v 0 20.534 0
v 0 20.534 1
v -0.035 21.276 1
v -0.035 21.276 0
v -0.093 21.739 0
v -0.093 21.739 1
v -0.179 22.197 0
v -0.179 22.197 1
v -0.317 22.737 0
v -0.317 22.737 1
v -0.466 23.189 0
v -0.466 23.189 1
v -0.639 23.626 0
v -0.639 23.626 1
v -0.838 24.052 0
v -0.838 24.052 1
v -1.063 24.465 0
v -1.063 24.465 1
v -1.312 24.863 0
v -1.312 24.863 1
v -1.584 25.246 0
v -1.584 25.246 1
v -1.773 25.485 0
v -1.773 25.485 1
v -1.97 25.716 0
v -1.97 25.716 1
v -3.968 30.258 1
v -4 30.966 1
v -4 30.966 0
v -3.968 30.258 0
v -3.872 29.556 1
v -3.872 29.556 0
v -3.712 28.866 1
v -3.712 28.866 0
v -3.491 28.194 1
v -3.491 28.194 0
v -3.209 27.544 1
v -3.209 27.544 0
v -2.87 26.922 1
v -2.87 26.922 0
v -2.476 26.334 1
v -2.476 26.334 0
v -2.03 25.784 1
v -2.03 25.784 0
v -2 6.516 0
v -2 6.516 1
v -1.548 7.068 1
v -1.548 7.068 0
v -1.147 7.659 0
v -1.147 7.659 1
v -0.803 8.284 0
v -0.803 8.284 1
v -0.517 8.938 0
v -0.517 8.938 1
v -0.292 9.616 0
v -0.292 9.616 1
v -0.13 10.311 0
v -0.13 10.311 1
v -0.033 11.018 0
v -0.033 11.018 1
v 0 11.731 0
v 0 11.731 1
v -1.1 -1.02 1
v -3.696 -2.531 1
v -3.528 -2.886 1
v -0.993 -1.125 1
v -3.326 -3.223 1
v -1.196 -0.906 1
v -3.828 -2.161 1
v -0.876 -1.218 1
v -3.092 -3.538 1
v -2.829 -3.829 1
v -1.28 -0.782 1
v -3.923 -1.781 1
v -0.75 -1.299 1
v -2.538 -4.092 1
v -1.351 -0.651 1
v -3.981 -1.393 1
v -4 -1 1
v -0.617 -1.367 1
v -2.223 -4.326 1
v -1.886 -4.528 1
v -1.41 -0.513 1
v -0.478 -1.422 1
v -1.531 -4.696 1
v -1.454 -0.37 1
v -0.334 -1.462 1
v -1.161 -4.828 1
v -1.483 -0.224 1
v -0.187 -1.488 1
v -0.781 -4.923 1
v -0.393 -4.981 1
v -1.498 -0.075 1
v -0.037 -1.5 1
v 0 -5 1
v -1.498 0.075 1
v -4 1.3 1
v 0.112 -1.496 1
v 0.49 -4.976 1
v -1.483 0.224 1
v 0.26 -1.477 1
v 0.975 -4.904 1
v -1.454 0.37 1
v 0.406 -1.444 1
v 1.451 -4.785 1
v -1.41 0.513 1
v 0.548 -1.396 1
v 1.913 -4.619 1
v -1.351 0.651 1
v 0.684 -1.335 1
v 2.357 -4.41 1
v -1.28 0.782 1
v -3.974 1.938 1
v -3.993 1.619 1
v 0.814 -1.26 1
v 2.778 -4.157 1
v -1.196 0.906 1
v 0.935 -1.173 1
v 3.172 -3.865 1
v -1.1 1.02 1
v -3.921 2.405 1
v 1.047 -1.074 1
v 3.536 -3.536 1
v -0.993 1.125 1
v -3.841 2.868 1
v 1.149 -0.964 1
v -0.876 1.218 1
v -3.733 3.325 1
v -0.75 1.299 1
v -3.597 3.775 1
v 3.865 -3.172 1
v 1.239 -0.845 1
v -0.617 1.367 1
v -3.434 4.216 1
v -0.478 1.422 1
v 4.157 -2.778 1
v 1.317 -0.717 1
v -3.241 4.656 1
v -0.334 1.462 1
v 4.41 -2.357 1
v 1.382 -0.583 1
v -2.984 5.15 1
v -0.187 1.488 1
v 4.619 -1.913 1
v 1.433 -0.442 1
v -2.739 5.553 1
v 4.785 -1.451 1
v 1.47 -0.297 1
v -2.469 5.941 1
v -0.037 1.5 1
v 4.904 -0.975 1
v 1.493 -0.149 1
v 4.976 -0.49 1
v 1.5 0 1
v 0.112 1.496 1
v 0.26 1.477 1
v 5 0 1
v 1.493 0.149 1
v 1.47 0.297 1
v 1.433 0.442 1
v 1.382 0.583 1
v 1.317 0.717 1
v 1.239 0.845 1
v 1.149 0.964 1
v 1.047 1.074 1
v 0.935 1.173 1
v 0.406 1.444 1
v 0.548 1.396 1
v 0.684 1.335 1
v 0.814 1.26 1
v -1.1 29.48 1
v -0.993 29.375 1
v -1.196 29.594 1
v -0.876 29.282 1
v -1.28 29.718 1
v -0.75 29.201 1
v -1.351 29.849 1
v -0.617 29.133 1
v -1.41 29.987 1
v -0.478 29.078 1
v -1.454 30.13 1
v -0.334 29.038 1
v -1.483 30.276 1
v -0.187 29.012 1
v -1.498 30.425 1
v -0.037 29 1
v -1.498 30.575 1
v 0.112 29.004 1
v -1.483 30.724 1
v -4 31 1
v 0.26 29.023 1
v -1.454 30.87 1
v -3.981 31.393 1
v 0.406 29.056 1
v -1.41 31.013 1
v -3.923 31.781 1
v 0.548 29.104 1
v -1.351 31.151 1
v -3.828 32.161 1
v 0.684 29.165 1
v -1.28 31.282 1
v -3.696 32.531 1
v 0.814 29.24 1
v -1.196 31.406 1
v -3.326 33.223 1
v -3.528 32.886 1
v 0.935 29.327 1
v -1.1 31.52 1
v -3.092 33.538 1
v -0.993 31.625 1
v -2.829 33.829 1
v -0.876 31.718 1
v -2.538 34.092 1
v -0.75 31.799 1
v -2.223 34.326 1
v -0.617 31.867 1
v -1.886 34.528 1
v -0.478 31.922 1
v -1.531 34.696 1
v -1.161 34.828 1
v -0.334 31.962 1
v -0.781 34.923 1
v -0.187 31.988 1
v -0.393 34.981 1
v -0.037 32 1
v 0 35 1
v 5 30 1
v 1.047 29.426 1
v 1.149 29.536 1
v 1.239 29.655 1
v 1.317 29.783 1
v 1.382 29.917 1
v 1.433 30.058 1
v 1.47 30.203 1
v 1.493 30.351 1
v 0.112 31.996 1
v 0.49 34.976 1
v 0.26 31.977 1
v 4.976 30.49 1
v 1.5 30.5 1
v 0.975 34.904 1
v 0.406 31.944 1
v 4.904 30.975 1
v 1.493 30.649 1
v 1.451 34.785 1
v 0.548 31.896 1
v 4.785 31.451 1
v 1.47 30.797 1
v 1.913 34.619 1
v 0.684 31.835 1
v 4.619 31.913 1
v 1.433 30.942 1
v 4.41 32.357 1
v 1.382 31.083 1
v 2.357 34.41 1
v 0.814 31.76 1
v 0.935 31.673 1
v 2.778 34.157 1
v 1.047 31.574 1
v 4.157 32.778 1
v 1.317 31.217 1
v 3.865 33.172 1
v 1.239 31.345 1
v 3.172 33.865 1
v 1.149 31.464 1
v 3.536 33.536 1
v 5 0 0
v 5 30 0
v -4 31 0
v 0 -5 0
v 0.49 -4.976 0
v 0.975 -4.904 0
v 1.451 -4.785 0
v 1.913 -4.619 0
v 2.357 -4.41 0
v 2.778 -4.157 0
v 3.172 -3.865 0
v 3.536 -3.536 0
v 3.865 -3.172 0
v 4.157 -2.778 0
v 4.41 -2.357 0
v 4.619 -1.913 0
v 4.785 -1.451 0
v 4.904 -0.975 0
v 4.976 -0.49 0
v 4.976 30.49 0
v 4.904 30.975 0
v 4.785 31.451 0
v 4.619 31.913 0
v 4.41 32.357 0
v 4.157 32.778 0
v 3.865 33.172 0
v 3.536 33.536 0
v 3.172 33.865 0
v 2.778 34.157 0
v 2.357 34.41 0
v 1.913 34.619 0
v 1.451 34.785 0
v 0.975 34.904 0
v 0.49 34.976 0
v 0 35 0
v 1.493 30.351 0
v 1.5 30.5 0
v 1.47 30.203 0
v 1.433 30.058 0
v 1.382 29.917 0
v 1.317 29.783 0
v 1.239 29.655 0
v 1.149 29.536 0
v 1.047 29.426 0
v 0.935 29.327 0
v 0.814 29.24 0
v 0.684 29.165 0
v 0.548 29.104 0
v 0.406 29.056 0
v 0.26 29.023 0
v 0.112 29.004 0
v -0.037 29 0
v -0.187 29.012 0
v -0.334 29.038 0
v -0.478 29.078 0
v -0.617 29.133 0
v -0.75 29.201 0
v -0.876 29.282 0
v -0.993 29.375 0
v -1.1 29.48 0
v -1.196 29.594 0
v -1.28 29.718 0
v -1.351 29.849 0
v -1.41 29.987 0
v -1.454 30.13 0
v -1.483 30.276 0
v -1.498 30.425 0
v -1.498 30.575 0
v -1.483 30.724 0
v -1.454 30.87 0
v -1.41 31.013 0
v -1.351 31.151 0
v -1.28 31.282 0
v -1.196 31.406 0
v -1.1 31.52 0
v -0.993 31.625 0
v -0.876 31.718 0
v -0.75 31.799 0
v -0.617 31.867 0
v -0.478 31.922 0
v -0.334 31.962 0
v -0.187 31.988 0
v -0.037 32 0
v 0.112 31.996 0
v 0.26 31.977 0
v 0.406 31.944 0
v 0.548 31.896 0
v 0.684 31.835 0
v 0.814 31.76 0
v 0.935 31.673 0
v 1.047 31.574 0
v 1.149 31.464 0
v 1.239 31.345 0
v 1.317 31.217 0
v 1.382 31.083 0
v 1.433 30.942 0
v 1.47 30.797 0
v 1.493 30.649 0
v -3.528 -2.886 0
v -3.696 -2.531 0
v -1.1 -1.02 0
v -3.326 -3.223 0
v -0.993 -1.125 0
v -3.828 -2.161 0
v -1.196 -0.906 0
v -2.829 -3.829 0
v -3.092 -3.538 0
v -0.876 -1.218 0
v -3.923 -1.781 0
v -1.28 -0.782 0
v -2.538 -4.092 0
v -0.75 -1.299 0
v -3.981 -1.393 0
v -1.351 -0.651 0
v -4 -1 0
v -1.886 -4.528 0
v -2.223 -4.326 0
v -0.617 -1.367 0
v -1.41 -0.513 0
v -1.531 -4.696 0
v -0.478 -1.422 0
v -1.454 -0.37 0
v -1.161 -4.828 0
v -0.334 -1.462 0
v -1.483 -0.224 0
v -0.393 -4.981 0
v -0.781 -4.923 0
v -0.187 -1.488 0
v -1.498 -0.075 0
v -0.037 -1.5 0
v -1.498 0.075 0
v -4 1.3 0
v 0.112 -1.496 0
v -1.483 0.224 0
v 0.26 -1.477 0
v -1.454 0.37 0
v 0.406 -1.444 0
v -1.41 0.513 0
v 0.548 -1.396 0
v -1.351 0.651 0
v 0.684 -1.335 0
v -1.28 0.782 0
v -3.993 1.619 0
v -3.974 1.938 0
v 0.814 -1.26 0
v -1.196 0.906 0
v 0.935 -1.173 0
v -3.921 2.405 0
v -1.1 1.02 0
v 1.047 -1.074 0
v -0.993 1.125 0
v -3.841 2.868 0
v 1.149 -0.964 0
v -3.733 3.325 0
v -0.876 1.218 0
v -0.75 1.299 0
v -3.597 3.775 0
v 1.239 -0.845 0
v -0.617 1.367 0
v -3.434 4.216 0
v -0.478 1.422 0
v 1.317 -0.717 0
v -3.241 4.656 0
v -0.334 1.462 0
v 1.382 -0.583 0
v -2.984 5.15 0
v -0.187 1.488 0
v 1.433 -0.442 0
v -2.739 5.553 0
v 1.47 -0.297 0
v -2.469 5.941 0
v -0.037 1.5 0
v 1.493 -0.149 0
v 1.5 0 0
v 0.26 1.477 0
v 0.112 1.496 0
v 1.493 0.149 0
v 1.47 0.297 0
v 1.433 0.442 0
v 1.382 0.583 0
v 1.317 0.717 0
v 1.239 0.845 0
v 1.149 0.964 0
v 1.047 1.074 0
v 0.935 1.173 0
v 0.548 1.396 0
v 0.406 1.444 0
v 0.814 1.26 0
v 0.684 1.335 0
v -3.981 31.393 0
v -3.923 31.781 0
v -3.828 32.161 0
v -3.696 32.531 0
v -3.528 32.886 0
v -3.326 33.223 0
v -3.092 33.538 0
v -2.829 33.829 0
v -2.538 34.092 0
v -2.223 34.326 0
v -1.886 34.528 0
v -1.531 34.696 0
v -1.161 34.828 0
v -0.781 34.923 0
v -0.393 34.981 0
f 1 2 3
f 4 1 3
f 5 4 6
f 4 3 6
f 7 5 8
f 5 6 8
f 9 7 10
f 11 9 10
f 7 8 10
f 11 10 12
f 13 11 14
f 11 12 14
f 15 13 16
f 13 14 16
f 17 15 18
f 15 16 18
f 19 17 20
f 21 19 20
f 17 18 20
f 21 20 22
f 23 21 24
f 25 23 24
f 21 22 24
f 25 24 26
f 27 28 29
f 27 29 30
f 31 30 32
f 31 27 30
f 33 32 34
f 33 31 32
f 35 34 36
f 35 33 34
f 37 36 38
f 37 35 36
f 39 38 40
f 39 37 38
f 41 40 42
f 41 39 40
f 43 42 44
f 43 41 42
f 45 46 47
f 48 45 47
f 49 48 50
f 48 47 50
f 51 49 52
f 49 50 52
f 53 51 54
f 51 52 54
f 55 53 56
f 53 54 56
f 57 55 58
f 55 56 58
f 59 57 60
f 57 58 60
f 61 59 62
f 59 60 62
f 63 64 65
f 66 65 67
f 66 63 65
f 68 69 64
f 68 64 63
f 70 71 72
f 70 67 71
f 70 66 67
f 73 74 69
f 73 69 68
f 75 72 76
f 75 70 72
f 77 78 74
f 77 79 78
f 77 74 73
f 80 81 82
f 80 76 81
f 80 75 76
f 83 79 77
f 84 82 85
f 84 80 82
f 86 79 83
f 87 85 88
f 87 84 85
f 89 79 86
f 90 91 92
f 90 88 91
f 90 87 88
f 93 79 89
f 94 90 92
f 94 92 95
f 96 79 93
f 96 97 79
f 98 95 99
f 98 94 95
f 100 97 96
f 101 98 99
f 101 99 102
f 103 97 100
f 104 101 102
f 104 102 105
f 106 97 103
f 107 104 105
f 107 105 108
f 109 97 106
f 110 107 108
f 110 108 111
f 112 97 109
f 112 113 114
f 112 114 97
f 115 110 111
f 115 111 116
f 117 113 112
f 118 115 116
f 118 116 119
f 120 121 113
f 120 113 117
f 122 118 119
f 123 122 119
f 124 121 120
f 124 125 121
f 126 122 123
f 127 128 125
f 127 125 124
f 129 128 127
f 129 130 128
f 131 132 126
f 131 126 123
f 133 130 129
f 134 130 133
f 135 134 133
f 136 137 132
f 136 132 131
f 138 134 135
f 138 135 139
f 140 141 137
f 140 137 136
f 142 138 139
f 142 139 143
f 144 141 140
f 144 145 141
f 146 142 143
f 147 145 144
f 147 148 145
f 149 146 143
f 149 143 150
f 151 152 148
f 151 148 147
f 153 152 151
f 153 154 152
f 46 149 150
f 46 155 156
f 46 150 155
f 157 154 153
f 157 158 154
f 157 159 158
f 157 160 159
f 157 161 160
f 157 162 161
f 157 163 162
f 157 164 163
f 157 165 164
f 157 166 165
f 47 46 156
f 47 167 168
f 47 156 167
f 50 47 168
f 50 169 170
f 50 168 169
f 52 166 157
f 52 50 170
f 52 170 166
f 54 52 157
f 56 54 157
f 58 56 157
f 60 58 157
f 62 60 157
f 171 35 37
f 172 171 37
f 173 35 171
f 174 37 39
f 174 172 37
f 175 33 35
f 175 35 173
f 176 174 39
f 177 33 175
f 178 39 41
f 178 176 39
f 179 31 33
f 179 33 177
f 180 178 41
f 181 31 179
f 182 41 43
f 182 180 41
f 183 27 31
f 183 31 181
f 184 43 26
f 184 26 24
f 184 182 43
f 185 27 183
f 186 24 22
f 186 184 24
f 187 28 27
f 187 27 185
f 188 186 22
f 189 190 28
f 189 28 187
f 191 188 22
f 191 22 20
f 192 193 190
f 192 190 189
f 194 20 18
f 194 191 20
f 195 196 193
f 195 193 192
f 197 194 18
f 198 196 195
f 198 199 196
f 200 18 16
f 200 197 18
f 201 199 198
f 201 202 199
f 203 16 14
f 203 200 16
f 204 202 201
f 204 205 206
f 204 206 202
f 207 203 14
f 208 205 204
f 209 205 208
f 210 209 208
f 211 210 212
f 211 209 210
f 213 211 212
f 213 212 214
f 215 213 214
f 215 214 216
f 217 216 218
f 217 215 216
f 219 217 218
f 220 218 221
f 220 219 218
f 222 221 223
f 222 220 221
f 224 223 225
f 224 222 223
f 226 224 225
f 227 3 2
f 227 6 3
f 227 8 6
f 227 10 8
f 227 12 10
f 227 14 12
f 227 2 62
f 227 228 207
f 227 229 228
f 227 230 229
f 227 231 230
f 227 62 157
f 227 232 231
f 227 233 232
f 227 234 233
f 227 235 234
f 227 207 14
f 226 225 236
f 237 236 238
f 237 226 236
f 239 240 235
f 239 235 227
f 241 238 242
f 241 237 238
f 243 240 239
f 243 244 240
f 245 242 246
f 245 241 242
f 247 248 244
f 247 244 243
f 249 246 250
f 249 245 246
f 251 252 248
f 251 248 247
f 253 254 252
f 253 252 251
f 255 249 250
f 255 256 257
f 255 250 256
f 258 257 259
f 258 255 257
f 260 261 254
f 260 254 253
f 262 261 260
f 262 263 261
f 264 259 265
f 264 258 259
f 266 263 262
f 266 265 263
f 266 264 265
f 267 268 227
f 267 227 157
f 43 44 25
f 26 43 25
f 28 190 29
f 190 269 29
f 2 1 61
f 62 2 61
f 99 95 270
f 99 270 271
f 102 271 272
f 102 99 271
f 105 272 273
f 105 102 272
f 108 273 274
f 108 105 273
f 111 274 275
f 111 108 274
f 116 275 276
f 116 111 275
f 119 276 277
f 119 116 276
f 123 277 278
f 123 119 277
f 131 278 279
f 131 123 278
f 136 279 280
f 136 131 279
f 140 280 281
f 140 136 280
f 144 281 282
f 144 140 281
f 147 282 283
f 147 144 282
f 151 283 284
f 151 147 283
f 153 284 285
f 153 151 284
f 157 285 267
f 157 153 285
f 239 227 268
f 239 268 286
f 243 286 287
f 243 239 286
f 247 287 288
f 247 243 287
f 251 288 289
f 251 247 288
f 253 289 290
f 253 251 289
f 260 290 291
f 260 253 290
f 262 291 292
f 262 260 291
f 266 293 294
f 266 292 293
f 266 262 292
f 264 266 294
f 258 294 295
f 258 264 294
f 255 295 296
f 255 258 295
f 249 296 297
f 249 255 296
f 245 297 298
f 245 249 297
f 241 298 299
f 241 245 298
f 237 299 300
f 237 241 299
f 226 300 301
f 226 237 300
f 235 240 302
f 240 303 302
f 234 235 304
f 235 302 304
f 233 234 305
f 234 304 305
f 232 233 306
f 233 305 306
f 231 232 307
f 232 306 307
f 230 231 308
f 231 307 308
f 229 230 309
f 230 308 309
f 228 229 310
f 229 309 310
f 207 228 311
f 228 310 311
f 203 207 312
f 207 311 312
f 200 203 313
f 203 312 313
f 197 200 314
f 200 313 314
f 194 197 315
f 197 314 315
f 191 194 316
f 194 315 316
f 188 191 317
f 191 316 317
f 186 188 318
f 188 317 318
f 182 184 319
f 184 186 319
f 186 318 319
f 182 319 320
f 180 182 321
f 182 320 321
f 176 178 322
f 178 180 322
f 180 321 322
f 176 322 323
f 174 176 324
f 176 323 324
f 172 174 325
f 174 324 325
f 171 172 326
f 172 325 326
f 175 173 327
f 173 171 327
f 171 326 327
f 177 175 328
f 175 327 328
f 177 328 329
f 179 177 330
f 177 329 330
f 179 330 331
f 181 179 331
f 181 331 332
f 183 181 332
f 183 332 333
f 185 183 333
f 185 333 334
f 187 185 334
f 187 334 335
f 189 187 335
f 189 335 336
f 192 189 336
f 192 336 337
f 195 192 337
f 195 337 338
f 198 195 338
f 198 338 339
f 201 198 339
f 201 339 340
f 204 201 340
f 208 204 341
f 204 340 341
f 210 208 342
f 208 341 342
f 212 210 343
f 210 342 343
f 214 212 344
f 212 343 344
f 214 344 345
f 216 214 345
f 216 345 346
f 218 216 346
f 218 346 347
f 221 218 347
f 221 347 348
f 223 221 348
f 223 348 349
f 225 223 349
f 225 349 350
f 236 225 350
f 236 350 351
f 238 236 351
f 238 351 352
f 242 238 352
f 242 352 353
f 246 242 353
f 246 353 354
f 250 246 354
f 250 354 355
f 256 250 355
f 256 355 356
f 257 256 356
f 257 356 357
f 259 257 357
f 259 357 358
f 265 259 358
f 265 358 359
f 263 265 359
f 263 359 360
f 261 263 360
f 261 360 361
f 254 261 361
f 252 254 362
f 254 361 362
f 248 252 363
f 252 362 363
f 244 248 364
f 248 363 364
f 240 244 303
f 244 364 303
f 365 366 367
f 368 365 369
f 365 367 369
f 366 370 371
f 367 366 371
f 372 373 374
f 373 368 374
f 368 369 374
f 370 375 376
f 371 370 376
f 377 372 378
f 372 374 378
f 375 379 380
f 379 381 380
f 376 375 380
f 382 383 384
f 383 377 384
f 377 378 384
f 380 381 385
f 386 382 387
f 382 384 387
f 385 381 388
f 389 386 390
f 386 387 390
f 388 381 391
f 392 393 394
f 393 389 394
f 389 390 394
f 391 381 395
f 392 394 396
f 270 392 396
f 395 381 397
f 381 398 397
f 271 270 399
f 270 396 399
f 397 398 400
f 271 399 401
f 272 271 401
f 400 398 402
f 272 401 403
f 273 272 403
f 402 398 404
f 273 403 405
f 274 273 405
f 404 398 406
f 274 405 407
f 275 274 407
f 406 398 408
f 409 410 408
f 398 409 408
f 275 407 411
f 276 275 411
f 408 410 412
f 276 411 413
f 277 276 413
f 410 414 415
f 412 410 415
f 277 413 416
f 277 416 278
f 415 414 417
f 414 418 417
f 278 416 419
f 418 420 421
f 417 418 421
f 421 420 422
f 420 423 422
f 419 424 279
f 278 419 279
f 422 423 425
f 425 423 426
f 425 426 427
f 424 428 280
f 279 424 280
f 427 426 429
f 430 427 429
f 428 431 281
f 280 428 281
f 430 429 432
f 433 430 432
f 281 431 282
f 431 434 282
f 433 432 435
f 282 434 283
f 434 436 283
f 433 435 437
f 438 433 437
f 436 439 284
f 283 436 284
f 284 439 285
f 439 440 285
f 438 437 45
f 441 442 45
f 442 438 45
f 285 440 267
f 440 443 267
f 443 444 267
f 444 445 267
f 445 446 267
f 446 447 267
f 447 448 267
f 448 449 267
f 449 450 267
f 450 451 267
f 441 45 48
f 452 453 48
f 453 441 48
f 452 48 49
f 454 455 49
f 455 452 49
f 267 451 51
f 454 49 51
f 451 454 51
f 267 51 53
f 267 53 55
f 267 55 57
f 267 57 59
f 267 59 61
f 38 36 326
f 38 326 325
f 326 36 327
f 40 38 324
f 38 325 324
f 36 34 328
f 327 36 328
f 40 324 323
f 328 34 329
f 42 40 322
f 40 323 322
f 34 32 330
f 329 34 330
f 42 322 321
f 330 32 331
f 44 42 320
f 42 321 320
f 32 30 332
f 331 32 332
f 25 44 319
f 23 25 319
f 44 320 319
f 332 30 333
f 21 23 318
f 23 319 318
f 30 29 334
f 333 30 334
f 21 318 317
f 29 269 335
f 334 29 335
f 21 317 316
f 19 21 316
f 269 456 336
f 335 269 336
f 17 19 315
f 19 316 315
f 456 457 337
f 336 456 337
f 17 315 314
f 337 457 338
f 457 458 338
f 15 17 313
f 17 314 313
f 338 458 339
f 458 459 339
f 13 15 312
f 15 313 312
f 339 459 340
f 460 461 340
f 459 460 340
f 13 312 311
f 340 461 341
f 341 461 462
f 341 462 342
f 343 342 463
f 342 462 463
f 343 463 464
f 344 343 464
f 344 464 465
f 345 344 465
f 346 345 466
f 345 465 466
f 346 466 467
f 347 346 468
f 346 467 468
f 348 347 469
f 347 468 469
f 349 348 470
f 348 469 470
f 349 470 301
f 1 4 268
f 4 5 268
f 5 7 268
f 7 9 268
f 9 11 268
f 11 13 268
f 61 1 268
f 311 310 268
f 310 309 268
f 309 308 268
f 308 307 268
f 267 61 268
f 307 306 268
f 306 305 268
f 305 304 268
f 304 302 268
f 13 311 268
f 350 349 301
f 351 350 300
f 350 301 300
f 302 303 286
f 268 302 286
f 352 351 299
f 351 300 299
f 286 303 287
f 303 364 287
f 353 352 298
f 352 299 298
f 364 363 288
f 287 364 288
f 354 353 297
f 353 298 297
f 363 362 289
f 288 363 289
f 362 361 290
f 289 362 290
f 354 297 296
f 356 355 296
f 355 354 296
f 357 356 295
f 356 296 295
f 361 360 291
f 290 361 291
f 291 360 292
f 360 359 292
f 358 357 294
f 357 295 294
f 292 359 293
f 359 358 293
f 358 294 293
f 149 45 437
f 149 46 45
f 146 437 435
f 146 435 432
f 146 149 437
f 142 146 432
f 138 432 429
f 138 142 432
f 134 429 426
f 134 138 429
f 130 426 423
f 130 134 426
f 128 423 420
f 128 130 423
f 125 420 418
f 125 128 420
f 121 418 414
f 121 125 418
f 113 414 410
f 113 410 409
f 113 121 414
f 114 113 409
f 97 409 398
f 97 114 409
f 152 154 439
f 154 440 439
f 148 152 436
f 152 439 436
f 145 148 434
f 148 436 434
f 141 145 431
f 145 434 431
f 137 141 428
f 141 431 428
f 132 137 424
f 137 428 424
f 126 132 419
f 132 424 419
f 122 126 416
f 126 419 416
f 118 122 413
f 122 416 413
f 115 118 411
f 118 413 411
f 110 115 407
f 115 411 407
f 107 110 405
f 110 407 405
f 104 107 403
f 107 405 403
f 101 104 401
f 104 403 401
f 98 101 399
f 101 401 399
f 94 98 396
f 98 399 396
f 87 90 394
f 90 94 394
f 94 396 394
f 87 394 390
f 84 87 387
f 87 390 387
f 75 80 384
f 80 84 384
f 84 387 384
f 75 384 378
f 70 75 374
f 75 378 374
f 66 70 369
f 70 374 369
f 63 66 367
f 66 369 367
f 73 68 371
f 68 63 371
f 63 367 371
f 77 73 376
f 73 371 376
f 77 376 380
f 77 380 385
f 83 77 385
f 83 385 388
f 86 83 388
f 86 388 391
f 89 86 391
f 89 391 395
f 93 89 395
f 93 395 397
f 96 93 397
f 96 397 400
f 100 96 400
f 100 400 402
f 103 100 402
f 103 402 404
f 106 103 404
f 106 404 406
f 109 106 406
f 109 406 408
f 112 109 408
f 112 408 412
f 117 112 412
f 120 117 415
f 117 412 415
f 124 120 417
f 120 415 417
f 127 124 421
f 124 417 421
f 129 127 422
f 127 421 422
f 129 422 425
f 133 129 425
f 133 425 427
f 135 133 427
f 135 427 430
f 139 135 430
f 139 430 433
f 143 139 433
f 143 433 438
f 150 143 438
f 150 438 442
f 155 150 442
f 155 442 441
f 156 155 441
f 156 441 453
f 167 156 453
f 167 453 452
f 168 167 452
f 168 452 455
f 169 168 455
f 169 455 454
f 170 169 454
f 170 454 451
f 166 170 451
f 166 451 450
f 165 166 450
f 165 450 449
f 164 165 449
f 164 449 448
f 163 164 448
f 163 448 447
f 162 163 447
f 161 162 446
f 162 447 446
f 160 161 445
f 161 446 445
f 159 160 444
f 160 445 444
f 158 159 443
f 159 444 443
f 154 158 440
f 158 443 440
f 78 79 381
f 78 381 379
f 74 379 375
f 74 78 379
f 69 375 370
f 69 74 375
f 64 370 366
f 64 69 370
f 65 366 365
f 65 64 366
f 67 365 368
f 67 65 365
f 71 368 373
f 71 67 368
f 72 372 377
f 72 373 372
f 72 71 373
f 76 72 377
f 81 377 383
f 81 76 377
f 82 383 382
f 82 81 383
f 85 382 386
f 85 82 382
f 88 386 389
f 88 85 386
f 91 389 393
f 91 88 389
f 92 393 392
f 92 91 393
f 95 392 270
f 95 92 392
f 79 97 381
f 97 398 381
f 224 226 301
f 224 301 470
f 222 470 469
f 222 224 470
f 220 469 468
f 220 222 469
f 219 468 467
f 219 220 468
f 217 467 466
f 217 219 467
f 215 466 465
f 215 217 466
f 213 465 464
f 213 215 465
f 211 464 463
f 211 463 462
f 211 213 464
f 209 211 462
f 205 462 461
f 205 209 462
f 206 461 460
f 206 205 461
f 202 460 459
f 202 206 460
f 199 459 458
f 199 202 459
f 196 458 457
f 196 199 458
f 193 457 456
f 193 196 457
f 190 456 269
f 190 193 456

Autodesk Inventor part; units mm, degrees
ref_plane "YZ Plane" through (0, 0, 0) normal (1, 0, 0) x (0, 1, 0)
ref_plane "XZ Plane" through (0, 0, 0) normal (0, 1, 0) x (-1, 0, 0)
ref_plane "XY Plane" through (0, 0, 0) normal (0, 0, 1) x (1, 0, 0)
sketch "Sketch1" plane through (0, 0, 0) normal (0, 0, 1) x (1, 0, 0)
  circle A0 centre (0, 0) radius 1.5
  circle A1 centre (0, 30.5) radius 1.5
  line L0 (0, 8.5) -> (-4, 4.5)
  line L1 (-4, 35) -> (-4, 25.5)
  line L2 (-4, 4.5) -> (-4, -5)
  line L3 (0, 21) -> (0, 8.5)
  line L4 (-4, 35) -> (5, 35)
  line L5 (-4, -5) -> (5, -5)
  line L6 (5, 35) -> (5, -5)
  line L7 (0, 21) -> (0, 23.5)
  line L8 (-4, 25.5) -> (-4, 28)
  line L9 (-4, 28) -> (0, 23.5)
  dimension "d0" = 3
  dimension "d1" = 3
  dimension "d47" = 9
  dimension "d48" = 9
  dimension "d52" = 4
  dimension "d55" = 4.5
  dimension "d59" = 40
  dimension "d60" = 2.5
  dimension "d61" = 2.5
extrude "Extrusion1" add sketch "Sketch1" along normal blind 1
fillet "Fillet9" radius 5 2 edges at (5, 35, 0.5) (5, -5, 0.5)
fillet "Fillet10" radius 4 2 edges at (-4, 35, 0.5) (-4, -5, 0.5)
fillet "Fillet11" radius 7.8 2 edges at (0, 8.5, 0.5) (-4, 4.5, 0.5)
fillet "Fillet12" radius 7.8 2 edges at (-4, 28, 0.5) (0, 23.5, 0.5)
properties part number "arm1" material "ABS Plastic"
